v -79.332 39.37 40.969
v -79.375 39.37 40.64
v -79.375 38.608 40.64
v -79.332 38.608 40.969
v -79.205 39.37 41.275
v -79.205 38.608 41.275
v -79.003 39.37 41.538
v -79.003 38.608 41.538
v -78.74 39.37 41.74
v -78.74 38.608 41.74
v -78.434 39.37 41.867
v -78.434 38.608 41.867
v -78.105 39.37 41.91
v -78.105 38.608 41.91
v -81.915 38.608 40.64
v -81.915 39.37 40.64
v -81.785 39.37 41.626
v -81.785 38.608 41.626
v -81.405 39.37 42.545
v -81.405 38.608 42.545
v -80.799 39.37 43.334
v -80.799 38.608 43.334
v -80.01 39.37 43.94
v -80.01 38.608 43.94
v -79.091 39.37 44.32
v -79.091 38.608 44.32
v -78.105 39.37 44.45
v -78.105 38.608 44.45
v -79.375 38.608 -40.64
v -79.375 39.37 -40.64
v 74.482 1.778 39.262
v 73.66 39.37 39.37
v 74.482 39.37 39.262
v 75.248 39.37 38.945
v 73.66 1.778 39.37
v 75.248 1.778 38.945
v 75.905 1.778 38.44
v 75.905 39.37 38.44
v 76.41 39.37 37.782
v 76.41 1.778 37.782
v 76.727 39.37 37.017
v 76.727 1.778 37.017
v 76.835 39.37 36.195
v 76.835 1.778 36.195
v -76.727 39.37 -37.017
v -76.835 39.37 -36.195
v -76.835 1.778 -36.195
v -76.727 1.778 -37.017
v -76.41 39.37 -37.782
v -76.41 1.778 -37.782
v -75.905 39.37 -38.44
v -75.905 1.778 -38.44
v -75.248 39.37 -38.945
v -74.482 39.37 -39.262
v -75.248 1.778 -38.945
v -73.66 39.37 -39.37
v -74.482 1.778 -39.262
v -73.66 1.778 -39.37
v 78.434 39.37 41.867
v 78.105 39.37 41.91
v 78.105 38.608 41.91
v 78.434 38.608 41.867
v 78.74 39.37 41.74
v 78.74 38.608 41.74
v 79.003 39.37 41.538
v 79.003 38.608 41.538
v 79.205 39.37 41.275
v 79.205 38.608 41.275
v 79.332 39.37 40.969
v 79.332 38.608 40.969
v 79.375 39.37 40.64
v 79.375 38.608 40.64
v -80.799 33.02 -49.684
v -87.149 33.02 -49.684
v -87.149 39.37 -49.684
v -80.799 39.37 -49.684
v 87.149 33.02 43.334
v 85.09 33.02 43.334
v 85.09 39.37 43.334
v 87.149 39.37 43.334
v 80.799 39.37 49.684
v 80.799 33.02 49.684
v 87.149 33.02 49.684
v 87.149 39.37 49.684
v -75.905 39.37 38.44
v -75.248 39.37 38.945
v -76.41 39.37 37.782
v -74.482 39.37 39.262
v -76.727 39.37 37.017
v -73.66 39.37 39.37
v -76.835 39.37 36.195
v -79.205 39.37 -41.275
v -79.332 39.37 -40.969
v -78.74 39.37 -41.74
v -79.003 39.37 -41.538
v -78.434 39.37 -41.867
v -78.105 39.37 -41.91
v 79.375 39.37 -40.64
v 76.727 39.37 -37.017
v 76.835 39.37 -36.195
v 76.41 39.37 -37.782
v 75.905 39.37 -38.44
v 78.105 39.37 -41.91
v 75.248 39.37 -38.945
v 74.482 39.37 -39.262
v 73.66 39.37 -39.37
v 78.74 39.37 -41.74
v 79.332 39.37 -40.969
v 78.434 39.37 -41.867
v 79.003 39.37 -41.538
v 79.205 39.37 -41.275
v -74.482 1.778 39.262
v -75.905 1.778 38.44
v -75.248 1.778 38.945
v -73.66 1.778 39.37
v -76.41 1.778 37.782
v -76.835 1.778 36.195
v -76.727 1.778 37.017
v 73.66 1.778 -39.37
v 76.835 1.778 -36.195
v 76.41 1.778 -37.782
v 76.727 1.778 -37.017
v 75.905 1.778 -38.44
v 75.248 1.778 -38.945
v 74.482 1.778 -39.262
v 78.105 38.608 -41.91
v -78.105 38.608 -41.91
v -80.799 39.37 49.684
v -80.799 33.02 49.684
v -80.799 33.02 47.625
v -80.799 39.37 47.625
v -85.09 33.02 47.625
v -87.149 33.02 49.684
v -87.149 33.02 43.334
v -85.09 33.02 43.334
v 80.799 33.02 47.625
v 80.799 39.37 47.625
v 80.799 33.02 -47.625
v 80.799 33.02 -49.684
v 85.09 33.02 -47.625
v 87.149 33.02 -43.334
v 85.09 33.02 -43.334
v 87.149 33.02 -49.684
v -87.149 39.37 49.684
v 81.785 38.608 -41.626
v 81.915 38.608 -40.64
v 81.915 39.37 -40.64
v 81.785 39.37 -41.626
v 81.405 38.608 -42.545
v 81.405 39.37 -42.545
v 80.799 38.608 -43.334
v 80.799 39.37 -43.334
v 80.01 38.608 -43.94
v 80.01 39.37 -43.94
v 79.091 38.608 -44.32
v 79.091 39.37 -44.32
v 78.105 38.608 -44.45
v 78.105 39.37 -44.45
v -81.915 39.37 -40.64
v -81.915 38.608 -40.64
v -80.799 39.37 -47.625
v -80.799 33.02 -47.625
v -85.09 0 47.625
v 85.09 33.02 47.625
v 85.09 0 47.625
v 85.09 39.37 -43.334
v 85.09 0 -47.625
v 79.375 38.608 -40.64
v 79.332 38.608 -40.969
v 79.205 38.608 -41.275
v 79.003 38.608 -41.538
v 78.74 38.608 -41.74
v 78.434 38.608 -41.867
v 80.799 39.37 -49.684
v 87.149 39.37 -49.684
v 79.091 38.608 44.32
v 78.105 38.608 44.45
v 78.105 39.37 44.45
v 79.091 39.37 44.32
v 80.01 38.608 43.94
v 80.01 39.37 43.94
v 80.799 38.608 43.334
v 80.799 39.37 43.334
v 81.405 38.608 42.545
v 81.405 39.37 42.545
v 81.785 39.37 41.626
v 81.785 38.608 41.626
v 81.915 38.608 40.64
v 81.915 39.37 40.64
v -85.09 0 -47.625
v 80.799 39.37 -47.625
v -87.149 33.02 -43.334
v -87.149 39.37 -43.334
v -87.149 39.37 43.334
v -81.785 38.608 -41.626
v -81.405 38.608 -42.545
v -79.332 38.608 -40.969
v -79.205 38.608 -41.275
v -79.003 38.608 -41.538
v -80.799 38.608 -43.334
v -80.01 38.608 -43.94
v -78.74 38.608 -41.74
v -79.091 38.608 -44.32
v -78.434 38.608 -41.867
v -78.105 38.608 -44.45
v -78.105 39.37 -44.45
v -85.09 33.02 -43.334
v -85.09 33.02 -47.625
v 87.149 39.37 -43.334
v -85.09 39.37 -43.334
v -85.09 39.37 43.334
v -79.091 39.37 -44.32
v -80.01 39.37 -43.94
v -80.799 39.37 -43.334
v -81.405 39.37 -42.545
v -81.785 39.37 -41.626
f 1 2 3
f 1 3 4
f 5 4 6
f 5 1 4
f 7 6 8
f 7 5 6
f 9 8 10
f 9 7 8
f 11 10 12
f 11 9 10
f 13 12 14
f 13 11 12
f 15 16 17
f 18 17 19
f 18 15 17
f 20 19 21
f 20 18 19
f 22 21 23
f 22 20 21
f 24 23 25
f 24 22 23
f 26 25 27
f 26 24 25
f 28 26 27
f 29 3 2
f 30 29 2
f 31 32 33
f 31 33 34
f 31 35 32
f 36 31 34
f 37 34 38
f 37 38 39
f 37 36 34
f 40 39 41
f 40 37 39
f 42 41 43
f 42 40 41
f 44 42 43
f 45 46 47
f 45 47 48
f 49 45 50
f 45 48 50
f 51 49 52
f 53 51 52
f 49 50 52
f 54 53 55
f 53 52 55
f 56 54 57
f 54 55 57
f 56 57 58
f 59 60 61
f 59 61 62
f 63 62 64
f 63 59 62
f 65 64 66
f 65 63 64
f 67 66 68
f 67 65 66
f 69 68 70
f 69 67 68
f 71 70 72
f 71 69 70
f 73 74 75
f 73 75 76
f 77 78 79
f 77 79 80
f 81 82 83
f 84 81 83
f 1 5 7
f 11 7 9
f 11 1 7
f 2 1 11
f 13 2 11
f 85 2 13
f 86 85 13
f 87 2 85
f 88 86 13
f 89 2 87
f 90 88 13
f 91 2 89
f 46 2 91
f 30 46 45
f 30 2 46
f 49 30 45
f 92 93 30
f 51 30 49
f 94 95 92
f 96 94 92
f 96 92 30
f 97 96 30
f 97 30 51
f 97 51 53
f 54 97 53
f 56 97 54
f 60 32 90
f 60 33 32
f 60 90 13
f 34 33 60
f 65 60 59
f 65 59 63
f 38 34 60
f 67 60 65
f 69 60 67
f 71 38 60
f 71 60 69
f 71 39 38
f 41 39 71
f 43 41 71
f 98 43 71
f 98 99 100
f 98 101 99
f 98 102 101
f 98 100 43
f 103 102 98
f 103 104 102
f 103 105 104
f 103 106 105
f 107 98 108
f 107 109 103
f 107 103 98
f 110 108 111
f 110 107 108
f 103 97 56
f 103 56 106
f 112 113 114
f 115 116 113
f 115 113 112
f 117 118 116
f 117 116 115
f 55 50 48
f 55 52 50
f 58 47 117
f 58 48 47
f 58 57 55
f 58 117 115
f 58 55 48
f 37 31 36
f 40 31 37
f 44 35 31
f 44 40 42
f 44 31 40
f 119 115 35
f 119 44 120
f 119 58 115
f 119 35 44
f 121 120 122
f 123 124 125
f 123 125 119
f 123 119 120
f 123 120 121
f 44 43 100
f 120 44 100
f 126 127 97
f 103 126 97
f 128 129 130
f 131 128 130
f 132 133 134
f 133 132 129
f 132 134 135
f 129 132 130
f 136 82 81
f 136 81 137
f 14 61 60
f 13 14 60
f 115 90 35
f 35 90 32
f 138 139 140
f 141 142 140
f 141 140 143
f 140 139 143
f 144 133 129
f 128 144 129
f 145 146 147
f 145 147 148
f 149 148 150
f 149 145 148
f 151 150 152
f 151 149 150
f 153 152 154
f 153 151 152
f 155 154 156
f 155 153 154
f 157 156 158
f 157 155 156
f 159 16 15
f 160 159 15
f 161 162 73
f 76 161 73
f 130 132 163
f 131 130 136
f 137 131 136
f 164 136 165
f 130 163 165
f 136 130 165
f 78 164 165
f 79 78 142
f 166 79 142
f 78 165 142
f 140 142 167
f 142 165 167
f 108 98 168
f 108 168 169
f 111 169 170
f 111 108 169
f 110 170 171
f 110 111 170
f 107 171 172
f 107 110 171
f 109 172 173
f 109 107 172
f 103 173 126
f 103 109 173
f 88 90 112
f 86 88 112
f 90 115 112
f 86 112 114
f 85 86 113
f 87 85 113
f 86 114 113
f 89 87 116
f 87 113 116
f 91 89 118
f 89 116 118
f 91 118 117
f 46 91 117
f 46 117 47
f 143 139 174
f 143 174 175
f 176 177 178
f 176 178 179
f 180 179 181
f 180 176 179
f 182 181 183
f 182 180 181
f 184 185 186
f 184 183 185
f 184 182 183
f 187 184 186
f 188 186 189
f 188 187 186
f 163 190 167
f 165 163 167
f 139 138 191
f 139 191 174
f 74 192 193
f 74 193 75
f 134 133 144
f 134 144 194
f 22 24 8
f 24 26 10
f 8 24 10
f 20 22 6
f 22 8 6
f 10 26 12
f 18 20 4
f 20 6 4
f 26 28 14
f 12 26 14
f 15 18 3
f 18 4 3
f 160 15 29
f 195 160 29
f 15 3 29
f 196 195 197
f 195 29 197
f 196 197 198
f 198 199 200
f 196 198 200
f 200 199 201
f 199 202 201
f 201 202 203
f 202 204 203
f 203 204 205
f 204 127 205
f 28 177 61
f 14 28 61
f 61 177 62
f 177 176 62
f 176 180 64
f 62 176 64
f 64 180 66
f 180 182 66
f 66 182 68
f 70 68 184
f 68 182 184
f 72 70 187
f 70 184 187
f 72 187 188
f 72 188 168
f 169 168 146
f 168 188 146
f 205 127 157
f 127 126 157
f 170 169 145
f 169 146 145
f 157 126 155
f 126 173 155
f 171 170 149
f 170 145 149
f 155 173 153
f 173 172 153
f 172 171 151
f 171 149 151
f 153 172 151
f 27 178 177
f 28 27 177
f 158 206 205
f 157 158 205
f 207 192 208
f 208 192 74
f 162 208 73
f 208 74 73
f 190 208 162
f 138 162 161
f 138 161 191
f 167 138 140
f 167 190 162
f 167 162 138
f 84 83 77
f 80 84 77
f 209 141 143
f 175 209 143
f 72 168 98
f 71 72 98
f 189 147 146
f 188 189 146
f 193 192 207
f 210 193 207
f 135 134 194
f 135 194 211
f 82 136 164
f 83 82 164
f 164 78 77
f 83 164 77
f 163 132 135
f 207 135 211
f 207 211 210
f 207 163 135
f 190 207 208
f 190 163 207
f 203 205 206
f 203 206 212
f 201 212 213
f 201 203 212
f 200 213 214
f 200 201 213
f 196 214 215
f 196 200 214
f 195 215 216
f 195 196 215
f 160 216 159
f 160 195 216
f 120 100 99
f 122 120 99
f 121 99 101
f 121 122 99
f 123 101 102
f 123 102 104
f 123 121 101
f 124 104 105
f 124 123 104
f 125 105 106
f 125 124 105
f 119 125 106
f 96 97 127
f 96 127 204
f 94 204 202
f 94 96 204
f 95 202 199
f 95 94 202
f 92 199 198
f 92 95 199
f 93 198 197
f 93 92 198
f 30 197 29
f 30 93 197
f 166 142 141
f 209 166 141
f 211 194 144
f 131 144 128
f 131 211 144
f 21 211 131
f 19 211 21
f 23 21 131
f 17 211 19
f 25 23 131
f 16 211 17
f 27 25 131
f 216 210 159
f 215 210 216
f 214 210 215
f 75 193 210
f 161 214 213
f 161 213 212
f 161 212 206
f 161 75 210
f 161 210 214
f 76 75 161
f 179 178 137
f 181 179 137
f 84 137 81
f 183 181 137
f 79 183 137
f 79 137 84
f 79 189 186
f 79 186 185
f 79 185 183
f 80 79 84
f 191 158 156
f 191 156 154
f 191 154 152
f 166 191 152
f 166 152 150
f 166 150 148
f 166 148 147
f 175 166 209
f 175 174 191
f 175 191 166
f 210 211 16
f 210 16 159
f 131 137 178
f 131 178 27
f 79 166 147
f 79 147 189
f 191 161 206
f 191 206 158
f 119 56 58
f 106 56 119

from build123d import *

# Parameters (mm, degrees)
SKETCH1_W           = 170.18
SKETCH1_H           = 95.25
BOSS_EXTRUDE1_DEPTH = 39.37
SKETCH2_W           = 153.67
SKETCH2_H           = 78.74
CUT_EXTRUDE1_DEPTH  = 37.592
SKETCH4_W           = 2.54
SKETCH4_H           = 1.524
FILLET1_R           = 3.175
SKETCH5_W           = 6.35
SKETCH5_H           = 6.35
BOSS_EXTRUDE2_DEPTH = 6.35


with BuildPart() as part:
    # Sketch1 → Boss-Extrude1 (new body)
    with BuildSketch(Plane(origin=(0, 0, 0), x_dir=(1, 0, 0), z_dir=(0, 1, 0))):
        Rectangle(SKETCH1_W, SKETCH1_H)
    extrude(amount=BOSS_EXTRUDE1_DEPTH)

    # Sketch2 → Cut-Extrude1 (cut)
    with BuildSketch(Plane(origin=(0, 39.37, 0), x_dir=(1, 0, 0), z_dir=(0, 1, 0))):
        Rectangle(SKETCH2_W, SKETCH2_H)
    extrude(amount=-CUT_EXTRUDE1_DEPTH, mode=Mode.SUBTRACT)

    # Cut-Sweep1: sweep along a path in Sketch3
    with BuildLine(Plane(origin=(0, 39.37, 0), x_dir=(1, 0, 0), z_dir=(0, 1, 0))) as cut_sweep1_path:
        Line((-78.105, -43.18), (78.105, -43.18))
        ThreePointArc((78.105, -43.18), (79.901051224, -42.436051224), (80.645, -40.64))
        Line((80.645, -40.64), (80.645, 40.64))
        ThreePointArc((80.645, 40.64), (79.901051224, 42.436051224), (78.105, 43.18))
        Line((78.105, 43.18), (-78.105, 43.18))
        ThreePointArc((-78.105, 43.18), (-79.901051224, 42.436051224), (-80.645, 40.64))
        Line((-80.645, 40.64), (-80.645, -40.64))
        ThreePointArc((-80.645, -40.64), (-79.901051224, -42.436051224), (-78.105, -43.18))
    # Sketch4 → Cut-Sweep1 (sweep, cut)
    with BuildSketch(Plane(origin=(-80.645, 39.37, 40.64), x_dir=(1, 0, 0), z_dir=(0, 0, 1))):
        Rectangle(SKETCH4_W, SKETCH4_H)
    sweep(path=cut_sweep1_path.line, mode=Mode.SUBTRACT)

    # Fillet1
    fillet1_edges = [part.edges().sort_by_distance(p)[0] for p in [
        (76.835, 20.574, 39.37),
        (-76.835, 20.574, 39.37),
        (-76.835, 20.574, -39.37),
        (76.835, 20.574, -39.37),
    ]]
    fillet(fillet1_edges, radius=FILLET1_R)

    # Sketch5 → Boss-Extrude2 (add)
    with BuildSketch(Plane(origin=(0, 39.37, 0), x_dir=(1, 0, 0), z_dir=(0, 1, 0))):
        with Locations((-83.974076836, 46.509076836)):
            Rectangle(SKETCH5_W, SKETCH5_H)
        with Locations((83.974076836, 46.509076836)):
            Rectangle(SKETCH5_W, SKETCH5_H)
        with Locations((83.974076836, -46.509076836)):
            Rectangle(SKETCH5_W, SKETCH5_H)
        with Locations((-83.974076836, -46.509076836)):
            Rectangle(SKETCH5_W, SKETCH5_H)
    extrude(amount=-BOSS_EXTRUDE2_DEPTH)


solid = part.part
